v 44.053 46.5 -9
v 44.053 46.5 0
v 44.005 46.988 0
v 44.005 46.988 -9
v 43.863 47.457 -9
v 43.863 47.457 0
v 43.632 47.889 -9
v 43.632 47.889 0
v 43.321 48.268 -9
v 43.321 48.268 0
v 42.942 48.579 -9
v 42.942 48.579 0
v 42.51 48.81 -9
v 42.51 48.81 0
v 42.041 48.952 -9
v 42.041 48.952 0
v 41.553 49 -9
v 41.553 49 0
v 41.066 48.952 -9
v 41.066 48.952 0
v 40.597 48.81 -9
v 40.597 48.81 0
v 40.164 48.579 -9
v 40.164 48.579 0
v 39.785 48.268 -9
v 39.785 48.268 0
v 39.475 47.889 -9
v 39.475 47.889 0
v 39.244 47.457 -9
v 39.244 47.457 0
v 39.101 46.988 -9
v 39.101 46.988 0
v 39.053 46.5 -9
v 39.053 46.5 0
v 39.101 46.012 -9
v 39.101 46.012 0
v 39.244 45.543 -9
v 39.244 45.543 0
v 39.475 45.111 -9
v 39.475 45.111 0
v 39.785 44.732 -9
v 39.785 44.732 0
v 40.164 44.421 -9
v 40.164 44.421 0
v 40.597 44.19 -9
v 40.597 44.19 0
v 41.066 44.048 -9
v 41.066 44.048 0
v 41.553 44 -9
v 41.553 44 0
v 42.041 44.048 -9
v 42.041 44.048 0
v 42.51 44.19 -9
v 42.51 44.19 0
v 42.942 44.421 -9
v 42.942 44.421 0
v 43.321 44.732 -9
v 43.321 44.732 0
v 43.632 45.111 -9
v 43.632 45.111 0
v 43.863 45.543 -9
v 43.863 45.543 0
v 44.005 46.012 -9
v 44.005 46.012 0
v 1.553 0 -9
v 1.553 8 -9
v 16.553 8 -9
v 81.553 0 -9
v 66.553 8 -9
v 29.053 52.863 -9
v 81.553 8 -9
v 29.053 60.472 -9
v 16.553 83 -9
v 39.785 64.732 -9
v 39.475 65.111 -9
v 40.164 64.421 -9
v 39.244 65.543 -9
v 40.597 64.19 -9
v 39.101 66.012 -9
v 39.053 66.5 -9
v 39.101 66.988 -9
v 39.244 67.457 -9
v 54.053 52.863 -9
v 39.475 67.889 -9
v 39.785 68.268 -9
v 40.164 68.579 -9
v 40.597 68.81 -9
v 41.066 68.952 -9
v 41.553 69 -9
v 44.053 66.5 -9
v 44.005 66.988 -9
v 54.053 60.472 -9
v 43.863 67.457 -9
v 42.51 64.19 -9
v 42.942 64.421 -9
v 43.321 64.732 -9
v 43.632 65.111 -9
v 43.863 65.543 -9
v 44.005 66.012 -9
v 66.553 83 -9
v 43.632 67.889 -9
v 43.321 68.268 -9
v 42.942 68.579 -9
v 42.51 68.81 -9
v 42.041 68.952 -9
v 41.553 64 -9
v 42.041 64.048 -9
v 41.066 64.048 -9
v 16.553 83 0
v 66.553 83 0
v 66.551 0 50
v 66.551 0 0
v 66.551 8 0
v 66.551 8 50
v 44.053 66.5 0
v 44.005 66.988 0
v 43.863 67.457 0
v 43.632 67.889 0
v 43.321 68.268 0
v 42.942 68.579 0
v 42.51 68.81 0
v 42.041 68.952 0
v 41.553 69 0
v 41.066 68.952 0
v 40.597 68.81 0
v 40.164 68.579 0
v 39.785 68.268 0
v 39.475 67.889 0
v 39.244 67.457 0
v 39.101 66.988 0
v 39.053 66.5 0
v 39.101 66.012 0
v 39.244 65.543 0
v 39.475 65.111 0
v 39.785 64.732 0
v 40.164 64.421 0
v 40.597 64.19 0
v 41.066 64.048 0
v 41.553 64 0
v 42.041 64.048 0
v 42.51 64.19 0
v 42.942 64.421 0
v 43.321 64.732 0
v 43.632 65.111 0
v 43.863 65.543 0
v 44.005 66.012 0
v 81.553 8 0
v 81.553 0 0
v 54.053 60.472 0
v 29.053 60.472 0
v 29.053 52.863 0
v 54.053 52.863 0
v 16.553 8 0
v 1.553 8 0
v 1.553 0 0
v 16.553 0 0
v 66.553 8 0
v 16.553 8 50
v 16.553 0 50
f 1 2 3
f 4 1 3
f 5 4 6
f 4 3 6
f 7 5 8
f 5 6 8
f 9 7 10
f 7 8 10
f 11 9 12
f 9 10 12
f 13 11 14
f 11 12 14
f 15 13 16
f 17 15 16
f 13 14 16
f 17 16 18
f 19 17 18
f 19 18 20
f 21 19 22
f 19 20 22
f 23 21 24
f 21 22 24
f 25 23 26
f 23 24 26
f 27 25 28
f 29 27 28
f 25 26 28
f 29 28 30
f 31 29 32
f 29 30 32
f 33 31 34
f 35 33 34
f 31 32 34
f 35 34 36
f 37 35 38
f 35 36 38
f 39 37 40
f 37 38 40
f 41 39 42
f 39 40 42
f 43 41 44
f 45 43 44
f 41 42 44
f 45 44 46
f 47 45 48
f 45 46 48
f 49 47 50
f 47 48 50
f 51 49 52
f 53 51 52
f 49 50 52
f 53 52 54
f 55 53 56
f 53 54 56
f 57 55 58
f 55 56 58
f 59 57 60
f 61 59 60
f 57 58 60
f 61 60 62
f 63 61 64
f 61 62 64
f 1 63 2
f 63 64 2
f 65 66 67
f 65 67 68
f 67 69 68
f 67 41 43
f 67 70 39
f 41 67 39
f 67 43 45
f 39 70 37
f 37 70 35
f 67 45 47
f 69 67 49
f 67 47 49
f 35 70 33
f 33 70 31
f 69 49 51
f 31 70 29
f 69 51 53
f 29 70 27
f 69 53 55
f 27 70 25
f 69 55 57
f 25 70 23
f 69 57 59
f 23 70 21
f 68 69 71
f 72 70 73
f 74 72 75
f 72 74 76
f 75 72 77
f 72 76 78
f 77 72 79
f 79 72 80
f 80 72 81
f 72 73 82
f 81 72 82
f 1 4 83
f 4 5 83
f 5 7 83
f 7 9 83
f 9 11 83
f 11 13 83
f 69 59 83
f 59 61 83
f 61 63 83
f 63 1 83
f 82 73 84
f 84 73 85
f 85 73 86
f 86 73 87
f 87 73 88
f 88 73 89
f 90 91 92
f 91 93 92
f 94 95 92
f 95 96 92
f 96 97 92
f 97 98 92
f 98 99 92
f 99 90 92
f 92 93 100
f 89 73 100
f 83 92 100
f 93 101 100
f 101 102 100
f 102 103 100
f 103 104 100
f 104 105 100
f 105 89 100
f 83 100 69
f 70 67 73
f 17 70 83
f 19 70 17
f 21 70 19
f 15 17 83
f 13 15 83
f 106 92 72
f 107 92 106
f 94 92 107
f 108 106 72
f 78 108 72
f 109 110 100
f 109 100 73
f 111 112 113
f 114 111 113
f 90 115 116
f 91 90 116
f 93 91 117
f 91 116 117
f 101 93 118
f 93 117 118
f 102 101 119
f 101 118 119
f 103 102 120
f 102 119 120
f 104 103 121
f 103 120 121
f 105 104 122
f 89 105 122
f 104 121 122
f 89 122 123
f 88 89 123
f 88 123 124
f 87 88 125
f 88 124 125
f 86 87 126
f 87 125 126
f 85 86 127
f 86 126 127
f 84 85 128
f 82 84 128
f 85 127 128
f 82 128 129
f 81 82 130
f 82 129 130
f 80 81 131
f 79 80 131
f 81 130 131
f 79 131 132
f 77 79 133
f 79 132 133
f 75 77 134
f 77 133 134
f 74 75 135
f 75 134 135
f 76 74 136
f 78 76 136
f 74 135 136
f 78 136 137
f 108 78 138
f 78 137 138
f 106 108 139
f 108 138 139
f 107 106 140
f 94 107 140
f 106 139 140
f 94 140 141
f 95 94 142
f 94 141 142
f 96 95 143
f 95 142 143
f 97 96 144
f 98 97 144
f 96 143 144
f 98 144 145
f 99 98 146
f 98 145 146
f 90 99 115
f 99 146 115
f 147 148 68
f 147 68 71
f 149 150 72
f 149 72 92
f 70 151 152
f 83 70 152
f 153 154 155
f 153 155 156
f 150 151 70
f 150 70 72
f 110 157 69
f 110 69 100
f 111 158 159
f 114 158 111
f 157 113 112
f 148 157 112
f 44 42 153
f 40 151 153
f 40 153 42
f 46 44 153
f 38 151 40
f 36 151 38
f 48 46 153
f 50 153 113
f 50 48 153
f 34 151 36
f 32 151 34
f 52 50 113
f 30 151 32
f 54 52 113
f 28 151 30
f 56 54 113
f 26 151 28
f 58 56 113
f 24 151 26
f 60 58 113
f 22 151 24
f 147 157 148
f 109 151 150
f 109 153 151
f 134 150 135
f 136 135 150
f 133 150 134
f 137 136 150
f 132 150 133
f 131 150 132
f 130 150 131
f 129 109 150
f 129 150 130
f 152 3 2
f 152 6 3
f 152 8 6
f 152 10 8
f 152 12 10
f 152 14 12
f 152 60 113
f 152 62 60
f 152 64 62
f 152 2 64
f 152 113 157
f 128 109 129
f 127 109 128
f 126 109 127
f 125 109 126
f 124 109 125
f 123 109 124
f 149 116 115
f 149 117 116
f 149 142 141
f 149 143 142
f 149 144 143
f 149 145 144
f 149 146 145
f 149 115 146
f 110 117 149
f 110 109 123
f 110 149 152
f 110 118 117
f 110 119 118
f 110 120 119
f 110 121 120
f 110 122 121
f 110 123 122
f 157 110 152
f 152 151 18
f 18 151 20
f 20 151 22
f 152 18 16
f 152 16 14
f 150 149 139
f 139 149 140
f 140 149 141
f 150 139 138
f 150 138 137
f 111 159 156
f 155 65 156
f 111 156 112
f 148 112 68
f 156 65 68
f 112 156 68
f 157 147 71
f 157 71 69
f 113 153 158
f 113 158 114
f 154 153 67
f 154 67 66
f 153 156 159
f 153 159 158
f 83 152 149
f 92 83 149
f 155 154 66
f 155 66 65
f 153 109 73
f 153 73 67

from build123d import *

# Parameters (mm, degrees)
ESQUISSE1_R        = 2.5
ESQUISSE1_W        = 25
ESQUISSE1_H        = 7.609144865
BOSS_EXTRU_1_DEPTH = 9
ESQUISSE2_W        = 49.997440748
ESQUISSE2_H        = 8
BOSS_EXTRU_2_DEPTH = 50


with BuildPart() as part:
    # Esquisse1 → Boss.-Extru.1 (new body)
    with BuildSketch(Plane.XY):
        Polygon((1.553236782, 0), (81.553236782, 0), (81.553236782, 8), (66.553236782, 8), (66.553236782, 83), (16.553236782, 83), (16.553236782, 8), (1.553236782, 8), align=None)
        with Locations((41.553236782, 46.5)):
            Circle(ESQUISSE1_R, mode=Mode.SUBTRACT)
        with Locations((41.553236782, 66.5)):
            Circle(ESQUISSE1_R, mode=Mode.SUBTRACT)
        with Locations((41.553236782, 56.667811129)):
            Rectangle(ESQUISSE1_W, ESQUISSE1_H, mode=Mode.SUBTRACT)
    extrude(amount=-BOSS_EXTRU_1_DEPTH)

    # Esquisse2 → Boss.-Extru.2 (add)
    with BuildSketch(Plane.XY):
        with Locations((41.551957156, 4)):
            Rectangle(ESQUISSE2_W, ESQUISSE2_H)
    extrude(amount=BOSS_EXTRU_2_DEPTH)


solid = part.part
